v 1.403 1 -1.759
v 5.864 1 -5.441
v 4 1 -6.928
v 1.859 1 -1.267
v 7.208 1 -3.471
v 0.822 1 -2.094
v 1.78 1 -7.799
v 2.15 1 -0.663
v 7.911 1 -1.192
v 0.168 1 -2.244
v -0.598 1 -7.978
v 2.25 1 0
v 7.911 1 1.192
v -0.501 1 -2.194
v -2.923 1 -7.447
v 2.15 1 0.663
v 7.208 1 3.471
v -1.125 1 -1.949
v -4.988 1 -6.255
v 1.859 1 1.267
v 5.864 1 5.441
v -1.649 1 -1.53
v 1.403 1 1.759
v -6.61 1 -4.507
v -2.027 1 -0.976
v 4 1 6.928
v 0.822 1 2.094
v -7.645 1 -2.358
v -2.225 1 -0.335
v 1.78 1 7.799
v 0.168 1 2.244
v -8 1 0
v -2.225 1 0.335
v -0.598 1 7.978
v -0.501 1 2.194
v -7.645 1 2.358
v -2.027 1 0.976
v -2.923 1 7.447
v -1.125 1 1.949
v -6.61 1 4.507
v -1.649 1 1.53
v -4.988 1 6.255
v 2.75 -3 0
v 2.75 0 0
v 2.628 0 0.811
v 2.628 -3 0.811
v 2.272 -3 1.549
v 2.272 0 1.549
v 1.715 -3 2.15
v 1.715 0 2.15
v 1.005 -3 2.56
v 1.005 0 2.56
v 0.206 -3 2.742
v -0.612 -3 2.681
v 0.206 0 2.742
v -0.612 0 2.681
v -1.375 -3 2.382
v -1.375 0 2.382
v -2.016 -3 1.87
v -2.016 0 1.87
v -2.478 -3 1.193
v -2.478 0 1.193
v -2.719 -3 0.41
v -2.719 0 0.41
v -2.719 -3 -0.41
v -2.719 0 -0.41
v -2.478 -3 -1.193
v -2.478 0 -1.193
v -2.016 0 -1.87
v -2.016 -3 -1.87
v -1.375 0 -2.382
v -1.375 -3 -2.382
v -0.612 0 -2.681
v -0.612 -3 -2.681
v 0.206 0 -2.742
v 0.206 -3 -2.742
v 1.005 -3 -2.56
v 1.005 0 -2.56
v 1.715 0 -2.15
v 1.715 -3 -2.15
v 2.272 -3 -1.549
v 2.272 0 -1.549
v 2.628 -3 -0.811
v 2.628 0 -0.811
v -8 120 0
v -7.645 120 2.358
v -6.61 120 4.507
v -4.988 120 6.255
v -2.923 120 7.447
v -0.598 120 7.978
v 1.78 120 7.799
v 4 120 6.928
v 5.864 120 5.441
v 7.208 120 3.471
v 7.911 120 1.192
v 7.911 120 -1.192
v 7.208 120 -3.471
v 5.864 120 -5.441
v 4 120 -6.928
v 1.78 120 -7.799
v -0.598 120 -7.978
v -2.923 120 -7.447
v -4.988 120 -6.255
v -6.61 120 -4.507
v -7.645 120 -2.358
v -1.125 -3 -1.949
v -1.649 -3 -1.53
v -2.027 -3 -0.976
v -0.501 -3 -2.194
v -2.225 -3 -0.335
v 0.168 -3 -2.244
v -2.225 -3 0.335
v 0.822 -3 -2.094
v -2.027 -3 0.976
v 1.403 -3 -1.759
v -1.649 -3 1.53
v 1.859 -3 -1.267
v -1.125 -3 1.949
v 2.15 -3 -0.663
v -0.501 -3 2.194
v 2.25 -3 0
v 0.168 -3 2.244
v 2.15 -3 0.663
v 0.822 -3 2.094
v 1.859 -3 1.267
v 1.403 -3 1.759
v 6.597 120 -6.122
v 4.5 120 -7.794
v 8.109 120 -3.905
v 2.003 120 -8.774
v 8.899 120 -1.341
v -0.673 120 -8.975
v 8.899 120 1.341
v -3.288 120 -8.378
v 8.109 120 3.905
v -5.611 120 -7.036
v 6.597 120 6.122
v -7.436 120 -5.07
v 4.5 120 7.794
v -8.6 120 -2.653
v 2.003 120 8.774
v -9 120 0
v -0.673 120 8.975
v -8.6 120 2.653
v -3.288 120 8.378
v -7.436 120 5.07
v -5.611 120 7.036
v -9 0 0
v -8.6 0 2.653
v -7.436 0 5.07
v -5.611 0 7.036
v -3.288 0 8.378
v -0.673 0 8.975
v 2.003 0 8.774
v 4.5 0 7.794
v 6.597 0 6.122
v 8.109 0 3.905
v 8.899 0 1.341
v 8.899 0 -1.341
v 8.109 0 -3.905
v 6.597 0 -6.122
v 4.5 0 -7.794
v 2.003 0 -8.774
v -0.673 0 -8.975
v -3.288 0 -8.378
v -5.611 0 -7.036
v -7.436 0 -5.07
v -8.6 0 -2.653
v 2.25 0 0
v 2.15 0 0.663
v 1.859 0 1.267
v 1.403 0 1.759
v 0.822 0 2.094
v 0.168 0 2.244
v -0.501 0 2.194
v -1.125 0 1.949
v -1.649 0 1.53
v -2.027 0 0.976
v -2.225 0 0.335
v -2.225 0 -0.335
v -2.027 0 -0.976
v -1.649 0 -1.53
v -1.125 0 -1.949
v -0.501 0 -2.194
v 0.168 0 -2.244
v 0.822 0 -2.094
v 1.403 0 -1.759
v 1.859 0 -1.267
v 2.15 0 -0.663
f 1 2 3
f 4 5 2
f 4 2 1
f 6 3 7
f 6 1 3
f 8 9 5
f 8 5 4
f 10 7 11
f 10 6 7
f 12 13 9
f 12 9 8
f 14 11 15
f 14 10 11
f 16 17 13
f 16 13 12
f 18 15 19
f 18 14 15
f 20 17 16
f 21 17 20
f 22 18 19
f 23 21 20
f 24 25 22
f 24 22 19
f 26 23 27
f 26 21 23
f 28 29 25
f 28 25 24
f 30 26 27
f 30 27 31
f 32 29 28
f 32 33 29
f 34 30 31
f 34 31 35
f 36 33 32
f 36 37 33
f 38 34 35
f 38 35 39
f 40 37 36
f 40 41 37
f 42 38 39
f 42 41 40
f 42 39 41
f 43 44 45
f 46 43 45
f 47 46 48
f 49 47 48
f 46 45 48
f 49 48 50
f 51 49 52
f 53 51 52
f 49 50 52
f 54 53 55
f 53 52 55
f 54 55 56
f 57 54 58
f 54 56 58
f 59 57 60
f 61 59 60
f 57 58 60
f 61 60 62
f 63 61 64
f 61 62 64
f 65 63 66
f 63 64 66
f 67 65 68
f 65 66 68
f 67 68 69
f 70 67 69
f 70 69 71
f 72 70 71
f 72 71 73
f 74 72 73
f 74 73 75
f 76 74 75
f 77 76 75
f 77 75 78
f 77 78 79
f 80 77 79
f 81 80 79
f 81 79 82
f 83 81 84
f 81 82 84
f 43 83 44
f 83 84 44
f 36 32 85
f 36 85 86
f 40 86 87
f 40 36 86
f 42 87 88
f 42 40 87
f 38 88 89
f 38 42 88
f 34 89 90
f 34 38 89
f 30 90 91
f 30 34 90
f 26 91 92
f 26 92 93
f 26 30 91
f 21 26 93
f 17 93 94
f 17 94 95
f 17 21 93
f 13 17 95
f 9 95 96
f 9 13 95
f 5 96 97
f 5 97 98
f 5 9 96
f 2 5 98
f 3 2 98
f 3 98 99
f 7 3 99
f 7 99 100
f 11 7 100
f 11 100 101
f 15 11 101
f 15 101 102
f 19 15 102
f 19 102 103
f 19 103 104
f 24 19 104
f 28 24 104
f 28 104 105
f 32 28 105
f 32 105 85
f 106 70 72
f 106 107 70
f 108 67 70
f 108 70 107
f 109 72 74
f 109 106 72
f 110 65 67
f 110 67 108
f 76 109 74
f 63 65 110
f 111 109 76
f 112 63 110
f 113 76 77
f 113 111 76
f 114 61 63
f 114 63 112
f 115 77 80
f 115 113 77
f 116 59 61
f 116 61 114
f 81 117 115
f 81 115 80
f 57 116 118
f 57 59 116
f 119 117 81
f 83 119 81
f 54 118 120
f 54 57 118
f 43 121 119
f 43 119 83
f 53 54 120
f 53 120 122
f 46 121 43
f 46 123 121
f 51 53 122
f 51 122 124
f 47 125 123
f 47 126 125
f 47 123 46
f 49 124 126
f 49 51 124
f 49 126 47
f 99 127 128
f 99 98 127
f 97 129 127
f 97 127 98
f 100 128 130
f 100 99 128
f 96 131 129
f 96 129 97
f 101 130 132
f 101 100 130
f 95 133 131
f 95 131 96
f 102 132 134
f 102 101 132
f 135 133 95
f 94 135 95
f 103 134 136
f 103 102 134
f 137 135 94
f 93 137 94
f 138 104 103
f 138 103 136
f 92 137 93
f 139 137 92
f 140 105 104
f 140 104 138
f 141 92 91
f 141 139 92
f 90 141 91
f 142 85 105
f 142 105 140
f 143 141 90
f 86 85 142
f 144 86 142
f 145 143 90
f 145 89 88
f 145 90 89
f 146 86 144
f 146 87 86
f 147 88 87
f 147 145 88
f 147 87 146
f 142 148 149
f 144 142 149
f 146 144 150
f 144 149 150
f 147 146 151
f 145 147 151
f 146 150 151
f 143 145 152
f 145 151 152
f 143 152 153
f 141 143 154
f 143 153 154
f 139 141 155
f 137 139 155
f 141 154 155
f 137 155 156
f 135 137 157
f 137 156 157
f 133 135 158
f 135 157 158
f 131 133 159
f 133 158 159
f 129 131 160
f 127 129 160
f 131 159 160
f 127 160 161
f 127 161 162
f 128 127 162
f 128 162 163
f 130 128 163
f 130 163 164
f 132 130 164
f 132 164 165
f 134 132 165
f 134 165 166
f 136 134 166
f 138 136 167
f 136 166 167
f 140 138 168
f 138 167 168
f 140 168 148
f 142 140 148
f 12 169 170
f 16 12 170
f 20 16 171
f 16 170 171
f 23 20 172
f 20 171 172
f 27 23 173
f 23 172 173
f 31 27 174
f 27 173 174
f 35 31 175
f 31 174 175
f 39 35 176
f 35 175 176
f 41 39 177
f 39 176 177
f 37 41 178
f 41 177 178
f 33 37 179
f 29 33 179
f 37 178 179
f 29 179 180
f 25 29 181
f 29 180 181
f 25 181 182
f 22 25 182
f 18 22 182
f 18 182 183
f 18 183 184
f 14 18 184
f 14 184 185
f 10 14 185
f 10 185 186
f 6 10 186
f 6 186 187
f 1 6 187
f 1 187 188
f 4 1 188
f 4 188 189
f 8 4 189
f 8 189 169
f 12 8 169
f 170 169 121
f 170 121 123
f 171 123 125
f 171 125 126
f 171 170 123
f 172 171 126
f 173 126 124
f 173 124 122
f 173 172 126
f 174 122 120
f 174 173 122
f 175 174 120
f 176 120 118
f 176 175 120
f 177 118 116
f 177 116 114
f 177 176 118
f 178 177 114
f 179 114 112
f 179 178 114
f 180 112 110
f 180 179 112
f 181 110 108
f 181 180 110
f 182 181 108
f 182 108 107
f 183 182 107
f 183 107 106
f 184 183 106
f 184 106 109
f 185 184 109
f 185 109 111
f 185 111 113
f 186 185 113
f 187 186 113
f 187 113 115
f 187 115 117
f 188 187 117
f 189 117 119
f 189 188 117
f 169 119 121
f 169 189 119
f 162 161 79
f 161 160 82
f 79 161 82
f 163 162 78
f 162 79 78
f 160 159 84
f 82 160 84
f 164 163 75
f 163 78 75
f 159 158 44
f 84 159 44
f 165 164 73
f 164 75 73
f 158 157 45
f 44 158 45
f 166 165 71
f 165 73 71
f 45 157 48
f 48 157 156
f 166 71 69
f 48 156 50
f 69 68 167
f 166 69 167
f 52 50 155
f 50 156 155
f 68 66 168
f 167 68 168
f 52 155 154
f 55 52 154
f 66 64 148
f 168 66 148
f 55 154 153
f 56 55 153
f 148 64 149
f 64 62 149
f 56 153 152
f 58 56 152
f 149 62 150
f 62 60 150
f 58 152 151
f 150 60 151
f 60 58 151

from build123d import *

# Parameters (mm, degrees)
F0_R     = 2.75
F0_R_2   = 2.25
F1_DEPTH = 3
F2_R     = 9
F3_DEPTH = 120
F4_T     = 1
F5_DEPTH = 25


# Not quite as in the source:
# - a shell that OpenCascade refuses in one call is made with other operations: the cavity is built on its own and cut out


with BuildPart() as f1:
    # F0 (on Front) → F1 (new body)
    with BuildSketch(Plane.XZ):
        Circle(F0_R)
        Circle(F0_R_2, mode=Mode.SUBTRACT)
    extrude(amount=F1_DEPTH)

    # F2 (on face) → F3 (join)
    with BuildSketch(Plane(origin=(0, 0, 0), x_dir=(-1, 0, 0), z_dir=(0, 1, 0))):
        Circle(F2_R)
    extrude(amount=F3_DEPTH)

    # F4: shell of thickness 1, made by hand


with BuildPart() as f4_core1:
    # F4_t2: copy of F1
    add(f1.part)

    # the walls: a layer under each face that stays
    f4_faces = [f4_core1.faces().sort_by_distance(p)[0] for p in [
        (9, 60, 0),
        (6, 0, -6),
        (-2.75, -1.5, 0),
        (-1.8333333333, -3, -1.8333333333),
        (-2.25, -1.5, 0),
        (0, 0, 0),
    ]]
    thicken(f4_faces, amount=-F4_T, mode=Mode.SUBTRACT)

    # F4_s3 → F4_t4 (revolve, cut)
    with BuildSketch(Plane.XY):
        Polygon((2.76, -0.01), (2.75, 1), (1.75, 1), (1.75, 0), align=None)
    revolve(axis=Axis((0, 0, 0), (0, -1, 0)), mode=Mode.SUBTRACT)

    # F4_s5 → F4_t6 (revolve, cut)
    with BuildSketch(Plane.XY):
        Polygon((2.24, -0.01), (3.25, 0), (3.25, 1), (2.25, 1), align=None)
    revolve(axis=Axis((0, 0, 0), (0, -1, 0)), mode=Mode.SUBTRACT)


with BuildPart() as f1_1:
    add(f1.part)

    # what is left inside the walls is the cavity
    f4_cavity = [f4_core1.part.solids().sort_by_distance(p)[0] for p in [
        (7.99, 80.333333, 0),
    ]]
    add(f4_cavity, mode=Mode.SUBTRACT)

    # F0 (on Front) → F5 (cut)
    with BuildSketch(Plane.XZ):
        Circle(F0_R_2)
    extrude(amount=-F5_DEPTH, mode=Mode.SUBTRACT)


solid = f1_1.part
